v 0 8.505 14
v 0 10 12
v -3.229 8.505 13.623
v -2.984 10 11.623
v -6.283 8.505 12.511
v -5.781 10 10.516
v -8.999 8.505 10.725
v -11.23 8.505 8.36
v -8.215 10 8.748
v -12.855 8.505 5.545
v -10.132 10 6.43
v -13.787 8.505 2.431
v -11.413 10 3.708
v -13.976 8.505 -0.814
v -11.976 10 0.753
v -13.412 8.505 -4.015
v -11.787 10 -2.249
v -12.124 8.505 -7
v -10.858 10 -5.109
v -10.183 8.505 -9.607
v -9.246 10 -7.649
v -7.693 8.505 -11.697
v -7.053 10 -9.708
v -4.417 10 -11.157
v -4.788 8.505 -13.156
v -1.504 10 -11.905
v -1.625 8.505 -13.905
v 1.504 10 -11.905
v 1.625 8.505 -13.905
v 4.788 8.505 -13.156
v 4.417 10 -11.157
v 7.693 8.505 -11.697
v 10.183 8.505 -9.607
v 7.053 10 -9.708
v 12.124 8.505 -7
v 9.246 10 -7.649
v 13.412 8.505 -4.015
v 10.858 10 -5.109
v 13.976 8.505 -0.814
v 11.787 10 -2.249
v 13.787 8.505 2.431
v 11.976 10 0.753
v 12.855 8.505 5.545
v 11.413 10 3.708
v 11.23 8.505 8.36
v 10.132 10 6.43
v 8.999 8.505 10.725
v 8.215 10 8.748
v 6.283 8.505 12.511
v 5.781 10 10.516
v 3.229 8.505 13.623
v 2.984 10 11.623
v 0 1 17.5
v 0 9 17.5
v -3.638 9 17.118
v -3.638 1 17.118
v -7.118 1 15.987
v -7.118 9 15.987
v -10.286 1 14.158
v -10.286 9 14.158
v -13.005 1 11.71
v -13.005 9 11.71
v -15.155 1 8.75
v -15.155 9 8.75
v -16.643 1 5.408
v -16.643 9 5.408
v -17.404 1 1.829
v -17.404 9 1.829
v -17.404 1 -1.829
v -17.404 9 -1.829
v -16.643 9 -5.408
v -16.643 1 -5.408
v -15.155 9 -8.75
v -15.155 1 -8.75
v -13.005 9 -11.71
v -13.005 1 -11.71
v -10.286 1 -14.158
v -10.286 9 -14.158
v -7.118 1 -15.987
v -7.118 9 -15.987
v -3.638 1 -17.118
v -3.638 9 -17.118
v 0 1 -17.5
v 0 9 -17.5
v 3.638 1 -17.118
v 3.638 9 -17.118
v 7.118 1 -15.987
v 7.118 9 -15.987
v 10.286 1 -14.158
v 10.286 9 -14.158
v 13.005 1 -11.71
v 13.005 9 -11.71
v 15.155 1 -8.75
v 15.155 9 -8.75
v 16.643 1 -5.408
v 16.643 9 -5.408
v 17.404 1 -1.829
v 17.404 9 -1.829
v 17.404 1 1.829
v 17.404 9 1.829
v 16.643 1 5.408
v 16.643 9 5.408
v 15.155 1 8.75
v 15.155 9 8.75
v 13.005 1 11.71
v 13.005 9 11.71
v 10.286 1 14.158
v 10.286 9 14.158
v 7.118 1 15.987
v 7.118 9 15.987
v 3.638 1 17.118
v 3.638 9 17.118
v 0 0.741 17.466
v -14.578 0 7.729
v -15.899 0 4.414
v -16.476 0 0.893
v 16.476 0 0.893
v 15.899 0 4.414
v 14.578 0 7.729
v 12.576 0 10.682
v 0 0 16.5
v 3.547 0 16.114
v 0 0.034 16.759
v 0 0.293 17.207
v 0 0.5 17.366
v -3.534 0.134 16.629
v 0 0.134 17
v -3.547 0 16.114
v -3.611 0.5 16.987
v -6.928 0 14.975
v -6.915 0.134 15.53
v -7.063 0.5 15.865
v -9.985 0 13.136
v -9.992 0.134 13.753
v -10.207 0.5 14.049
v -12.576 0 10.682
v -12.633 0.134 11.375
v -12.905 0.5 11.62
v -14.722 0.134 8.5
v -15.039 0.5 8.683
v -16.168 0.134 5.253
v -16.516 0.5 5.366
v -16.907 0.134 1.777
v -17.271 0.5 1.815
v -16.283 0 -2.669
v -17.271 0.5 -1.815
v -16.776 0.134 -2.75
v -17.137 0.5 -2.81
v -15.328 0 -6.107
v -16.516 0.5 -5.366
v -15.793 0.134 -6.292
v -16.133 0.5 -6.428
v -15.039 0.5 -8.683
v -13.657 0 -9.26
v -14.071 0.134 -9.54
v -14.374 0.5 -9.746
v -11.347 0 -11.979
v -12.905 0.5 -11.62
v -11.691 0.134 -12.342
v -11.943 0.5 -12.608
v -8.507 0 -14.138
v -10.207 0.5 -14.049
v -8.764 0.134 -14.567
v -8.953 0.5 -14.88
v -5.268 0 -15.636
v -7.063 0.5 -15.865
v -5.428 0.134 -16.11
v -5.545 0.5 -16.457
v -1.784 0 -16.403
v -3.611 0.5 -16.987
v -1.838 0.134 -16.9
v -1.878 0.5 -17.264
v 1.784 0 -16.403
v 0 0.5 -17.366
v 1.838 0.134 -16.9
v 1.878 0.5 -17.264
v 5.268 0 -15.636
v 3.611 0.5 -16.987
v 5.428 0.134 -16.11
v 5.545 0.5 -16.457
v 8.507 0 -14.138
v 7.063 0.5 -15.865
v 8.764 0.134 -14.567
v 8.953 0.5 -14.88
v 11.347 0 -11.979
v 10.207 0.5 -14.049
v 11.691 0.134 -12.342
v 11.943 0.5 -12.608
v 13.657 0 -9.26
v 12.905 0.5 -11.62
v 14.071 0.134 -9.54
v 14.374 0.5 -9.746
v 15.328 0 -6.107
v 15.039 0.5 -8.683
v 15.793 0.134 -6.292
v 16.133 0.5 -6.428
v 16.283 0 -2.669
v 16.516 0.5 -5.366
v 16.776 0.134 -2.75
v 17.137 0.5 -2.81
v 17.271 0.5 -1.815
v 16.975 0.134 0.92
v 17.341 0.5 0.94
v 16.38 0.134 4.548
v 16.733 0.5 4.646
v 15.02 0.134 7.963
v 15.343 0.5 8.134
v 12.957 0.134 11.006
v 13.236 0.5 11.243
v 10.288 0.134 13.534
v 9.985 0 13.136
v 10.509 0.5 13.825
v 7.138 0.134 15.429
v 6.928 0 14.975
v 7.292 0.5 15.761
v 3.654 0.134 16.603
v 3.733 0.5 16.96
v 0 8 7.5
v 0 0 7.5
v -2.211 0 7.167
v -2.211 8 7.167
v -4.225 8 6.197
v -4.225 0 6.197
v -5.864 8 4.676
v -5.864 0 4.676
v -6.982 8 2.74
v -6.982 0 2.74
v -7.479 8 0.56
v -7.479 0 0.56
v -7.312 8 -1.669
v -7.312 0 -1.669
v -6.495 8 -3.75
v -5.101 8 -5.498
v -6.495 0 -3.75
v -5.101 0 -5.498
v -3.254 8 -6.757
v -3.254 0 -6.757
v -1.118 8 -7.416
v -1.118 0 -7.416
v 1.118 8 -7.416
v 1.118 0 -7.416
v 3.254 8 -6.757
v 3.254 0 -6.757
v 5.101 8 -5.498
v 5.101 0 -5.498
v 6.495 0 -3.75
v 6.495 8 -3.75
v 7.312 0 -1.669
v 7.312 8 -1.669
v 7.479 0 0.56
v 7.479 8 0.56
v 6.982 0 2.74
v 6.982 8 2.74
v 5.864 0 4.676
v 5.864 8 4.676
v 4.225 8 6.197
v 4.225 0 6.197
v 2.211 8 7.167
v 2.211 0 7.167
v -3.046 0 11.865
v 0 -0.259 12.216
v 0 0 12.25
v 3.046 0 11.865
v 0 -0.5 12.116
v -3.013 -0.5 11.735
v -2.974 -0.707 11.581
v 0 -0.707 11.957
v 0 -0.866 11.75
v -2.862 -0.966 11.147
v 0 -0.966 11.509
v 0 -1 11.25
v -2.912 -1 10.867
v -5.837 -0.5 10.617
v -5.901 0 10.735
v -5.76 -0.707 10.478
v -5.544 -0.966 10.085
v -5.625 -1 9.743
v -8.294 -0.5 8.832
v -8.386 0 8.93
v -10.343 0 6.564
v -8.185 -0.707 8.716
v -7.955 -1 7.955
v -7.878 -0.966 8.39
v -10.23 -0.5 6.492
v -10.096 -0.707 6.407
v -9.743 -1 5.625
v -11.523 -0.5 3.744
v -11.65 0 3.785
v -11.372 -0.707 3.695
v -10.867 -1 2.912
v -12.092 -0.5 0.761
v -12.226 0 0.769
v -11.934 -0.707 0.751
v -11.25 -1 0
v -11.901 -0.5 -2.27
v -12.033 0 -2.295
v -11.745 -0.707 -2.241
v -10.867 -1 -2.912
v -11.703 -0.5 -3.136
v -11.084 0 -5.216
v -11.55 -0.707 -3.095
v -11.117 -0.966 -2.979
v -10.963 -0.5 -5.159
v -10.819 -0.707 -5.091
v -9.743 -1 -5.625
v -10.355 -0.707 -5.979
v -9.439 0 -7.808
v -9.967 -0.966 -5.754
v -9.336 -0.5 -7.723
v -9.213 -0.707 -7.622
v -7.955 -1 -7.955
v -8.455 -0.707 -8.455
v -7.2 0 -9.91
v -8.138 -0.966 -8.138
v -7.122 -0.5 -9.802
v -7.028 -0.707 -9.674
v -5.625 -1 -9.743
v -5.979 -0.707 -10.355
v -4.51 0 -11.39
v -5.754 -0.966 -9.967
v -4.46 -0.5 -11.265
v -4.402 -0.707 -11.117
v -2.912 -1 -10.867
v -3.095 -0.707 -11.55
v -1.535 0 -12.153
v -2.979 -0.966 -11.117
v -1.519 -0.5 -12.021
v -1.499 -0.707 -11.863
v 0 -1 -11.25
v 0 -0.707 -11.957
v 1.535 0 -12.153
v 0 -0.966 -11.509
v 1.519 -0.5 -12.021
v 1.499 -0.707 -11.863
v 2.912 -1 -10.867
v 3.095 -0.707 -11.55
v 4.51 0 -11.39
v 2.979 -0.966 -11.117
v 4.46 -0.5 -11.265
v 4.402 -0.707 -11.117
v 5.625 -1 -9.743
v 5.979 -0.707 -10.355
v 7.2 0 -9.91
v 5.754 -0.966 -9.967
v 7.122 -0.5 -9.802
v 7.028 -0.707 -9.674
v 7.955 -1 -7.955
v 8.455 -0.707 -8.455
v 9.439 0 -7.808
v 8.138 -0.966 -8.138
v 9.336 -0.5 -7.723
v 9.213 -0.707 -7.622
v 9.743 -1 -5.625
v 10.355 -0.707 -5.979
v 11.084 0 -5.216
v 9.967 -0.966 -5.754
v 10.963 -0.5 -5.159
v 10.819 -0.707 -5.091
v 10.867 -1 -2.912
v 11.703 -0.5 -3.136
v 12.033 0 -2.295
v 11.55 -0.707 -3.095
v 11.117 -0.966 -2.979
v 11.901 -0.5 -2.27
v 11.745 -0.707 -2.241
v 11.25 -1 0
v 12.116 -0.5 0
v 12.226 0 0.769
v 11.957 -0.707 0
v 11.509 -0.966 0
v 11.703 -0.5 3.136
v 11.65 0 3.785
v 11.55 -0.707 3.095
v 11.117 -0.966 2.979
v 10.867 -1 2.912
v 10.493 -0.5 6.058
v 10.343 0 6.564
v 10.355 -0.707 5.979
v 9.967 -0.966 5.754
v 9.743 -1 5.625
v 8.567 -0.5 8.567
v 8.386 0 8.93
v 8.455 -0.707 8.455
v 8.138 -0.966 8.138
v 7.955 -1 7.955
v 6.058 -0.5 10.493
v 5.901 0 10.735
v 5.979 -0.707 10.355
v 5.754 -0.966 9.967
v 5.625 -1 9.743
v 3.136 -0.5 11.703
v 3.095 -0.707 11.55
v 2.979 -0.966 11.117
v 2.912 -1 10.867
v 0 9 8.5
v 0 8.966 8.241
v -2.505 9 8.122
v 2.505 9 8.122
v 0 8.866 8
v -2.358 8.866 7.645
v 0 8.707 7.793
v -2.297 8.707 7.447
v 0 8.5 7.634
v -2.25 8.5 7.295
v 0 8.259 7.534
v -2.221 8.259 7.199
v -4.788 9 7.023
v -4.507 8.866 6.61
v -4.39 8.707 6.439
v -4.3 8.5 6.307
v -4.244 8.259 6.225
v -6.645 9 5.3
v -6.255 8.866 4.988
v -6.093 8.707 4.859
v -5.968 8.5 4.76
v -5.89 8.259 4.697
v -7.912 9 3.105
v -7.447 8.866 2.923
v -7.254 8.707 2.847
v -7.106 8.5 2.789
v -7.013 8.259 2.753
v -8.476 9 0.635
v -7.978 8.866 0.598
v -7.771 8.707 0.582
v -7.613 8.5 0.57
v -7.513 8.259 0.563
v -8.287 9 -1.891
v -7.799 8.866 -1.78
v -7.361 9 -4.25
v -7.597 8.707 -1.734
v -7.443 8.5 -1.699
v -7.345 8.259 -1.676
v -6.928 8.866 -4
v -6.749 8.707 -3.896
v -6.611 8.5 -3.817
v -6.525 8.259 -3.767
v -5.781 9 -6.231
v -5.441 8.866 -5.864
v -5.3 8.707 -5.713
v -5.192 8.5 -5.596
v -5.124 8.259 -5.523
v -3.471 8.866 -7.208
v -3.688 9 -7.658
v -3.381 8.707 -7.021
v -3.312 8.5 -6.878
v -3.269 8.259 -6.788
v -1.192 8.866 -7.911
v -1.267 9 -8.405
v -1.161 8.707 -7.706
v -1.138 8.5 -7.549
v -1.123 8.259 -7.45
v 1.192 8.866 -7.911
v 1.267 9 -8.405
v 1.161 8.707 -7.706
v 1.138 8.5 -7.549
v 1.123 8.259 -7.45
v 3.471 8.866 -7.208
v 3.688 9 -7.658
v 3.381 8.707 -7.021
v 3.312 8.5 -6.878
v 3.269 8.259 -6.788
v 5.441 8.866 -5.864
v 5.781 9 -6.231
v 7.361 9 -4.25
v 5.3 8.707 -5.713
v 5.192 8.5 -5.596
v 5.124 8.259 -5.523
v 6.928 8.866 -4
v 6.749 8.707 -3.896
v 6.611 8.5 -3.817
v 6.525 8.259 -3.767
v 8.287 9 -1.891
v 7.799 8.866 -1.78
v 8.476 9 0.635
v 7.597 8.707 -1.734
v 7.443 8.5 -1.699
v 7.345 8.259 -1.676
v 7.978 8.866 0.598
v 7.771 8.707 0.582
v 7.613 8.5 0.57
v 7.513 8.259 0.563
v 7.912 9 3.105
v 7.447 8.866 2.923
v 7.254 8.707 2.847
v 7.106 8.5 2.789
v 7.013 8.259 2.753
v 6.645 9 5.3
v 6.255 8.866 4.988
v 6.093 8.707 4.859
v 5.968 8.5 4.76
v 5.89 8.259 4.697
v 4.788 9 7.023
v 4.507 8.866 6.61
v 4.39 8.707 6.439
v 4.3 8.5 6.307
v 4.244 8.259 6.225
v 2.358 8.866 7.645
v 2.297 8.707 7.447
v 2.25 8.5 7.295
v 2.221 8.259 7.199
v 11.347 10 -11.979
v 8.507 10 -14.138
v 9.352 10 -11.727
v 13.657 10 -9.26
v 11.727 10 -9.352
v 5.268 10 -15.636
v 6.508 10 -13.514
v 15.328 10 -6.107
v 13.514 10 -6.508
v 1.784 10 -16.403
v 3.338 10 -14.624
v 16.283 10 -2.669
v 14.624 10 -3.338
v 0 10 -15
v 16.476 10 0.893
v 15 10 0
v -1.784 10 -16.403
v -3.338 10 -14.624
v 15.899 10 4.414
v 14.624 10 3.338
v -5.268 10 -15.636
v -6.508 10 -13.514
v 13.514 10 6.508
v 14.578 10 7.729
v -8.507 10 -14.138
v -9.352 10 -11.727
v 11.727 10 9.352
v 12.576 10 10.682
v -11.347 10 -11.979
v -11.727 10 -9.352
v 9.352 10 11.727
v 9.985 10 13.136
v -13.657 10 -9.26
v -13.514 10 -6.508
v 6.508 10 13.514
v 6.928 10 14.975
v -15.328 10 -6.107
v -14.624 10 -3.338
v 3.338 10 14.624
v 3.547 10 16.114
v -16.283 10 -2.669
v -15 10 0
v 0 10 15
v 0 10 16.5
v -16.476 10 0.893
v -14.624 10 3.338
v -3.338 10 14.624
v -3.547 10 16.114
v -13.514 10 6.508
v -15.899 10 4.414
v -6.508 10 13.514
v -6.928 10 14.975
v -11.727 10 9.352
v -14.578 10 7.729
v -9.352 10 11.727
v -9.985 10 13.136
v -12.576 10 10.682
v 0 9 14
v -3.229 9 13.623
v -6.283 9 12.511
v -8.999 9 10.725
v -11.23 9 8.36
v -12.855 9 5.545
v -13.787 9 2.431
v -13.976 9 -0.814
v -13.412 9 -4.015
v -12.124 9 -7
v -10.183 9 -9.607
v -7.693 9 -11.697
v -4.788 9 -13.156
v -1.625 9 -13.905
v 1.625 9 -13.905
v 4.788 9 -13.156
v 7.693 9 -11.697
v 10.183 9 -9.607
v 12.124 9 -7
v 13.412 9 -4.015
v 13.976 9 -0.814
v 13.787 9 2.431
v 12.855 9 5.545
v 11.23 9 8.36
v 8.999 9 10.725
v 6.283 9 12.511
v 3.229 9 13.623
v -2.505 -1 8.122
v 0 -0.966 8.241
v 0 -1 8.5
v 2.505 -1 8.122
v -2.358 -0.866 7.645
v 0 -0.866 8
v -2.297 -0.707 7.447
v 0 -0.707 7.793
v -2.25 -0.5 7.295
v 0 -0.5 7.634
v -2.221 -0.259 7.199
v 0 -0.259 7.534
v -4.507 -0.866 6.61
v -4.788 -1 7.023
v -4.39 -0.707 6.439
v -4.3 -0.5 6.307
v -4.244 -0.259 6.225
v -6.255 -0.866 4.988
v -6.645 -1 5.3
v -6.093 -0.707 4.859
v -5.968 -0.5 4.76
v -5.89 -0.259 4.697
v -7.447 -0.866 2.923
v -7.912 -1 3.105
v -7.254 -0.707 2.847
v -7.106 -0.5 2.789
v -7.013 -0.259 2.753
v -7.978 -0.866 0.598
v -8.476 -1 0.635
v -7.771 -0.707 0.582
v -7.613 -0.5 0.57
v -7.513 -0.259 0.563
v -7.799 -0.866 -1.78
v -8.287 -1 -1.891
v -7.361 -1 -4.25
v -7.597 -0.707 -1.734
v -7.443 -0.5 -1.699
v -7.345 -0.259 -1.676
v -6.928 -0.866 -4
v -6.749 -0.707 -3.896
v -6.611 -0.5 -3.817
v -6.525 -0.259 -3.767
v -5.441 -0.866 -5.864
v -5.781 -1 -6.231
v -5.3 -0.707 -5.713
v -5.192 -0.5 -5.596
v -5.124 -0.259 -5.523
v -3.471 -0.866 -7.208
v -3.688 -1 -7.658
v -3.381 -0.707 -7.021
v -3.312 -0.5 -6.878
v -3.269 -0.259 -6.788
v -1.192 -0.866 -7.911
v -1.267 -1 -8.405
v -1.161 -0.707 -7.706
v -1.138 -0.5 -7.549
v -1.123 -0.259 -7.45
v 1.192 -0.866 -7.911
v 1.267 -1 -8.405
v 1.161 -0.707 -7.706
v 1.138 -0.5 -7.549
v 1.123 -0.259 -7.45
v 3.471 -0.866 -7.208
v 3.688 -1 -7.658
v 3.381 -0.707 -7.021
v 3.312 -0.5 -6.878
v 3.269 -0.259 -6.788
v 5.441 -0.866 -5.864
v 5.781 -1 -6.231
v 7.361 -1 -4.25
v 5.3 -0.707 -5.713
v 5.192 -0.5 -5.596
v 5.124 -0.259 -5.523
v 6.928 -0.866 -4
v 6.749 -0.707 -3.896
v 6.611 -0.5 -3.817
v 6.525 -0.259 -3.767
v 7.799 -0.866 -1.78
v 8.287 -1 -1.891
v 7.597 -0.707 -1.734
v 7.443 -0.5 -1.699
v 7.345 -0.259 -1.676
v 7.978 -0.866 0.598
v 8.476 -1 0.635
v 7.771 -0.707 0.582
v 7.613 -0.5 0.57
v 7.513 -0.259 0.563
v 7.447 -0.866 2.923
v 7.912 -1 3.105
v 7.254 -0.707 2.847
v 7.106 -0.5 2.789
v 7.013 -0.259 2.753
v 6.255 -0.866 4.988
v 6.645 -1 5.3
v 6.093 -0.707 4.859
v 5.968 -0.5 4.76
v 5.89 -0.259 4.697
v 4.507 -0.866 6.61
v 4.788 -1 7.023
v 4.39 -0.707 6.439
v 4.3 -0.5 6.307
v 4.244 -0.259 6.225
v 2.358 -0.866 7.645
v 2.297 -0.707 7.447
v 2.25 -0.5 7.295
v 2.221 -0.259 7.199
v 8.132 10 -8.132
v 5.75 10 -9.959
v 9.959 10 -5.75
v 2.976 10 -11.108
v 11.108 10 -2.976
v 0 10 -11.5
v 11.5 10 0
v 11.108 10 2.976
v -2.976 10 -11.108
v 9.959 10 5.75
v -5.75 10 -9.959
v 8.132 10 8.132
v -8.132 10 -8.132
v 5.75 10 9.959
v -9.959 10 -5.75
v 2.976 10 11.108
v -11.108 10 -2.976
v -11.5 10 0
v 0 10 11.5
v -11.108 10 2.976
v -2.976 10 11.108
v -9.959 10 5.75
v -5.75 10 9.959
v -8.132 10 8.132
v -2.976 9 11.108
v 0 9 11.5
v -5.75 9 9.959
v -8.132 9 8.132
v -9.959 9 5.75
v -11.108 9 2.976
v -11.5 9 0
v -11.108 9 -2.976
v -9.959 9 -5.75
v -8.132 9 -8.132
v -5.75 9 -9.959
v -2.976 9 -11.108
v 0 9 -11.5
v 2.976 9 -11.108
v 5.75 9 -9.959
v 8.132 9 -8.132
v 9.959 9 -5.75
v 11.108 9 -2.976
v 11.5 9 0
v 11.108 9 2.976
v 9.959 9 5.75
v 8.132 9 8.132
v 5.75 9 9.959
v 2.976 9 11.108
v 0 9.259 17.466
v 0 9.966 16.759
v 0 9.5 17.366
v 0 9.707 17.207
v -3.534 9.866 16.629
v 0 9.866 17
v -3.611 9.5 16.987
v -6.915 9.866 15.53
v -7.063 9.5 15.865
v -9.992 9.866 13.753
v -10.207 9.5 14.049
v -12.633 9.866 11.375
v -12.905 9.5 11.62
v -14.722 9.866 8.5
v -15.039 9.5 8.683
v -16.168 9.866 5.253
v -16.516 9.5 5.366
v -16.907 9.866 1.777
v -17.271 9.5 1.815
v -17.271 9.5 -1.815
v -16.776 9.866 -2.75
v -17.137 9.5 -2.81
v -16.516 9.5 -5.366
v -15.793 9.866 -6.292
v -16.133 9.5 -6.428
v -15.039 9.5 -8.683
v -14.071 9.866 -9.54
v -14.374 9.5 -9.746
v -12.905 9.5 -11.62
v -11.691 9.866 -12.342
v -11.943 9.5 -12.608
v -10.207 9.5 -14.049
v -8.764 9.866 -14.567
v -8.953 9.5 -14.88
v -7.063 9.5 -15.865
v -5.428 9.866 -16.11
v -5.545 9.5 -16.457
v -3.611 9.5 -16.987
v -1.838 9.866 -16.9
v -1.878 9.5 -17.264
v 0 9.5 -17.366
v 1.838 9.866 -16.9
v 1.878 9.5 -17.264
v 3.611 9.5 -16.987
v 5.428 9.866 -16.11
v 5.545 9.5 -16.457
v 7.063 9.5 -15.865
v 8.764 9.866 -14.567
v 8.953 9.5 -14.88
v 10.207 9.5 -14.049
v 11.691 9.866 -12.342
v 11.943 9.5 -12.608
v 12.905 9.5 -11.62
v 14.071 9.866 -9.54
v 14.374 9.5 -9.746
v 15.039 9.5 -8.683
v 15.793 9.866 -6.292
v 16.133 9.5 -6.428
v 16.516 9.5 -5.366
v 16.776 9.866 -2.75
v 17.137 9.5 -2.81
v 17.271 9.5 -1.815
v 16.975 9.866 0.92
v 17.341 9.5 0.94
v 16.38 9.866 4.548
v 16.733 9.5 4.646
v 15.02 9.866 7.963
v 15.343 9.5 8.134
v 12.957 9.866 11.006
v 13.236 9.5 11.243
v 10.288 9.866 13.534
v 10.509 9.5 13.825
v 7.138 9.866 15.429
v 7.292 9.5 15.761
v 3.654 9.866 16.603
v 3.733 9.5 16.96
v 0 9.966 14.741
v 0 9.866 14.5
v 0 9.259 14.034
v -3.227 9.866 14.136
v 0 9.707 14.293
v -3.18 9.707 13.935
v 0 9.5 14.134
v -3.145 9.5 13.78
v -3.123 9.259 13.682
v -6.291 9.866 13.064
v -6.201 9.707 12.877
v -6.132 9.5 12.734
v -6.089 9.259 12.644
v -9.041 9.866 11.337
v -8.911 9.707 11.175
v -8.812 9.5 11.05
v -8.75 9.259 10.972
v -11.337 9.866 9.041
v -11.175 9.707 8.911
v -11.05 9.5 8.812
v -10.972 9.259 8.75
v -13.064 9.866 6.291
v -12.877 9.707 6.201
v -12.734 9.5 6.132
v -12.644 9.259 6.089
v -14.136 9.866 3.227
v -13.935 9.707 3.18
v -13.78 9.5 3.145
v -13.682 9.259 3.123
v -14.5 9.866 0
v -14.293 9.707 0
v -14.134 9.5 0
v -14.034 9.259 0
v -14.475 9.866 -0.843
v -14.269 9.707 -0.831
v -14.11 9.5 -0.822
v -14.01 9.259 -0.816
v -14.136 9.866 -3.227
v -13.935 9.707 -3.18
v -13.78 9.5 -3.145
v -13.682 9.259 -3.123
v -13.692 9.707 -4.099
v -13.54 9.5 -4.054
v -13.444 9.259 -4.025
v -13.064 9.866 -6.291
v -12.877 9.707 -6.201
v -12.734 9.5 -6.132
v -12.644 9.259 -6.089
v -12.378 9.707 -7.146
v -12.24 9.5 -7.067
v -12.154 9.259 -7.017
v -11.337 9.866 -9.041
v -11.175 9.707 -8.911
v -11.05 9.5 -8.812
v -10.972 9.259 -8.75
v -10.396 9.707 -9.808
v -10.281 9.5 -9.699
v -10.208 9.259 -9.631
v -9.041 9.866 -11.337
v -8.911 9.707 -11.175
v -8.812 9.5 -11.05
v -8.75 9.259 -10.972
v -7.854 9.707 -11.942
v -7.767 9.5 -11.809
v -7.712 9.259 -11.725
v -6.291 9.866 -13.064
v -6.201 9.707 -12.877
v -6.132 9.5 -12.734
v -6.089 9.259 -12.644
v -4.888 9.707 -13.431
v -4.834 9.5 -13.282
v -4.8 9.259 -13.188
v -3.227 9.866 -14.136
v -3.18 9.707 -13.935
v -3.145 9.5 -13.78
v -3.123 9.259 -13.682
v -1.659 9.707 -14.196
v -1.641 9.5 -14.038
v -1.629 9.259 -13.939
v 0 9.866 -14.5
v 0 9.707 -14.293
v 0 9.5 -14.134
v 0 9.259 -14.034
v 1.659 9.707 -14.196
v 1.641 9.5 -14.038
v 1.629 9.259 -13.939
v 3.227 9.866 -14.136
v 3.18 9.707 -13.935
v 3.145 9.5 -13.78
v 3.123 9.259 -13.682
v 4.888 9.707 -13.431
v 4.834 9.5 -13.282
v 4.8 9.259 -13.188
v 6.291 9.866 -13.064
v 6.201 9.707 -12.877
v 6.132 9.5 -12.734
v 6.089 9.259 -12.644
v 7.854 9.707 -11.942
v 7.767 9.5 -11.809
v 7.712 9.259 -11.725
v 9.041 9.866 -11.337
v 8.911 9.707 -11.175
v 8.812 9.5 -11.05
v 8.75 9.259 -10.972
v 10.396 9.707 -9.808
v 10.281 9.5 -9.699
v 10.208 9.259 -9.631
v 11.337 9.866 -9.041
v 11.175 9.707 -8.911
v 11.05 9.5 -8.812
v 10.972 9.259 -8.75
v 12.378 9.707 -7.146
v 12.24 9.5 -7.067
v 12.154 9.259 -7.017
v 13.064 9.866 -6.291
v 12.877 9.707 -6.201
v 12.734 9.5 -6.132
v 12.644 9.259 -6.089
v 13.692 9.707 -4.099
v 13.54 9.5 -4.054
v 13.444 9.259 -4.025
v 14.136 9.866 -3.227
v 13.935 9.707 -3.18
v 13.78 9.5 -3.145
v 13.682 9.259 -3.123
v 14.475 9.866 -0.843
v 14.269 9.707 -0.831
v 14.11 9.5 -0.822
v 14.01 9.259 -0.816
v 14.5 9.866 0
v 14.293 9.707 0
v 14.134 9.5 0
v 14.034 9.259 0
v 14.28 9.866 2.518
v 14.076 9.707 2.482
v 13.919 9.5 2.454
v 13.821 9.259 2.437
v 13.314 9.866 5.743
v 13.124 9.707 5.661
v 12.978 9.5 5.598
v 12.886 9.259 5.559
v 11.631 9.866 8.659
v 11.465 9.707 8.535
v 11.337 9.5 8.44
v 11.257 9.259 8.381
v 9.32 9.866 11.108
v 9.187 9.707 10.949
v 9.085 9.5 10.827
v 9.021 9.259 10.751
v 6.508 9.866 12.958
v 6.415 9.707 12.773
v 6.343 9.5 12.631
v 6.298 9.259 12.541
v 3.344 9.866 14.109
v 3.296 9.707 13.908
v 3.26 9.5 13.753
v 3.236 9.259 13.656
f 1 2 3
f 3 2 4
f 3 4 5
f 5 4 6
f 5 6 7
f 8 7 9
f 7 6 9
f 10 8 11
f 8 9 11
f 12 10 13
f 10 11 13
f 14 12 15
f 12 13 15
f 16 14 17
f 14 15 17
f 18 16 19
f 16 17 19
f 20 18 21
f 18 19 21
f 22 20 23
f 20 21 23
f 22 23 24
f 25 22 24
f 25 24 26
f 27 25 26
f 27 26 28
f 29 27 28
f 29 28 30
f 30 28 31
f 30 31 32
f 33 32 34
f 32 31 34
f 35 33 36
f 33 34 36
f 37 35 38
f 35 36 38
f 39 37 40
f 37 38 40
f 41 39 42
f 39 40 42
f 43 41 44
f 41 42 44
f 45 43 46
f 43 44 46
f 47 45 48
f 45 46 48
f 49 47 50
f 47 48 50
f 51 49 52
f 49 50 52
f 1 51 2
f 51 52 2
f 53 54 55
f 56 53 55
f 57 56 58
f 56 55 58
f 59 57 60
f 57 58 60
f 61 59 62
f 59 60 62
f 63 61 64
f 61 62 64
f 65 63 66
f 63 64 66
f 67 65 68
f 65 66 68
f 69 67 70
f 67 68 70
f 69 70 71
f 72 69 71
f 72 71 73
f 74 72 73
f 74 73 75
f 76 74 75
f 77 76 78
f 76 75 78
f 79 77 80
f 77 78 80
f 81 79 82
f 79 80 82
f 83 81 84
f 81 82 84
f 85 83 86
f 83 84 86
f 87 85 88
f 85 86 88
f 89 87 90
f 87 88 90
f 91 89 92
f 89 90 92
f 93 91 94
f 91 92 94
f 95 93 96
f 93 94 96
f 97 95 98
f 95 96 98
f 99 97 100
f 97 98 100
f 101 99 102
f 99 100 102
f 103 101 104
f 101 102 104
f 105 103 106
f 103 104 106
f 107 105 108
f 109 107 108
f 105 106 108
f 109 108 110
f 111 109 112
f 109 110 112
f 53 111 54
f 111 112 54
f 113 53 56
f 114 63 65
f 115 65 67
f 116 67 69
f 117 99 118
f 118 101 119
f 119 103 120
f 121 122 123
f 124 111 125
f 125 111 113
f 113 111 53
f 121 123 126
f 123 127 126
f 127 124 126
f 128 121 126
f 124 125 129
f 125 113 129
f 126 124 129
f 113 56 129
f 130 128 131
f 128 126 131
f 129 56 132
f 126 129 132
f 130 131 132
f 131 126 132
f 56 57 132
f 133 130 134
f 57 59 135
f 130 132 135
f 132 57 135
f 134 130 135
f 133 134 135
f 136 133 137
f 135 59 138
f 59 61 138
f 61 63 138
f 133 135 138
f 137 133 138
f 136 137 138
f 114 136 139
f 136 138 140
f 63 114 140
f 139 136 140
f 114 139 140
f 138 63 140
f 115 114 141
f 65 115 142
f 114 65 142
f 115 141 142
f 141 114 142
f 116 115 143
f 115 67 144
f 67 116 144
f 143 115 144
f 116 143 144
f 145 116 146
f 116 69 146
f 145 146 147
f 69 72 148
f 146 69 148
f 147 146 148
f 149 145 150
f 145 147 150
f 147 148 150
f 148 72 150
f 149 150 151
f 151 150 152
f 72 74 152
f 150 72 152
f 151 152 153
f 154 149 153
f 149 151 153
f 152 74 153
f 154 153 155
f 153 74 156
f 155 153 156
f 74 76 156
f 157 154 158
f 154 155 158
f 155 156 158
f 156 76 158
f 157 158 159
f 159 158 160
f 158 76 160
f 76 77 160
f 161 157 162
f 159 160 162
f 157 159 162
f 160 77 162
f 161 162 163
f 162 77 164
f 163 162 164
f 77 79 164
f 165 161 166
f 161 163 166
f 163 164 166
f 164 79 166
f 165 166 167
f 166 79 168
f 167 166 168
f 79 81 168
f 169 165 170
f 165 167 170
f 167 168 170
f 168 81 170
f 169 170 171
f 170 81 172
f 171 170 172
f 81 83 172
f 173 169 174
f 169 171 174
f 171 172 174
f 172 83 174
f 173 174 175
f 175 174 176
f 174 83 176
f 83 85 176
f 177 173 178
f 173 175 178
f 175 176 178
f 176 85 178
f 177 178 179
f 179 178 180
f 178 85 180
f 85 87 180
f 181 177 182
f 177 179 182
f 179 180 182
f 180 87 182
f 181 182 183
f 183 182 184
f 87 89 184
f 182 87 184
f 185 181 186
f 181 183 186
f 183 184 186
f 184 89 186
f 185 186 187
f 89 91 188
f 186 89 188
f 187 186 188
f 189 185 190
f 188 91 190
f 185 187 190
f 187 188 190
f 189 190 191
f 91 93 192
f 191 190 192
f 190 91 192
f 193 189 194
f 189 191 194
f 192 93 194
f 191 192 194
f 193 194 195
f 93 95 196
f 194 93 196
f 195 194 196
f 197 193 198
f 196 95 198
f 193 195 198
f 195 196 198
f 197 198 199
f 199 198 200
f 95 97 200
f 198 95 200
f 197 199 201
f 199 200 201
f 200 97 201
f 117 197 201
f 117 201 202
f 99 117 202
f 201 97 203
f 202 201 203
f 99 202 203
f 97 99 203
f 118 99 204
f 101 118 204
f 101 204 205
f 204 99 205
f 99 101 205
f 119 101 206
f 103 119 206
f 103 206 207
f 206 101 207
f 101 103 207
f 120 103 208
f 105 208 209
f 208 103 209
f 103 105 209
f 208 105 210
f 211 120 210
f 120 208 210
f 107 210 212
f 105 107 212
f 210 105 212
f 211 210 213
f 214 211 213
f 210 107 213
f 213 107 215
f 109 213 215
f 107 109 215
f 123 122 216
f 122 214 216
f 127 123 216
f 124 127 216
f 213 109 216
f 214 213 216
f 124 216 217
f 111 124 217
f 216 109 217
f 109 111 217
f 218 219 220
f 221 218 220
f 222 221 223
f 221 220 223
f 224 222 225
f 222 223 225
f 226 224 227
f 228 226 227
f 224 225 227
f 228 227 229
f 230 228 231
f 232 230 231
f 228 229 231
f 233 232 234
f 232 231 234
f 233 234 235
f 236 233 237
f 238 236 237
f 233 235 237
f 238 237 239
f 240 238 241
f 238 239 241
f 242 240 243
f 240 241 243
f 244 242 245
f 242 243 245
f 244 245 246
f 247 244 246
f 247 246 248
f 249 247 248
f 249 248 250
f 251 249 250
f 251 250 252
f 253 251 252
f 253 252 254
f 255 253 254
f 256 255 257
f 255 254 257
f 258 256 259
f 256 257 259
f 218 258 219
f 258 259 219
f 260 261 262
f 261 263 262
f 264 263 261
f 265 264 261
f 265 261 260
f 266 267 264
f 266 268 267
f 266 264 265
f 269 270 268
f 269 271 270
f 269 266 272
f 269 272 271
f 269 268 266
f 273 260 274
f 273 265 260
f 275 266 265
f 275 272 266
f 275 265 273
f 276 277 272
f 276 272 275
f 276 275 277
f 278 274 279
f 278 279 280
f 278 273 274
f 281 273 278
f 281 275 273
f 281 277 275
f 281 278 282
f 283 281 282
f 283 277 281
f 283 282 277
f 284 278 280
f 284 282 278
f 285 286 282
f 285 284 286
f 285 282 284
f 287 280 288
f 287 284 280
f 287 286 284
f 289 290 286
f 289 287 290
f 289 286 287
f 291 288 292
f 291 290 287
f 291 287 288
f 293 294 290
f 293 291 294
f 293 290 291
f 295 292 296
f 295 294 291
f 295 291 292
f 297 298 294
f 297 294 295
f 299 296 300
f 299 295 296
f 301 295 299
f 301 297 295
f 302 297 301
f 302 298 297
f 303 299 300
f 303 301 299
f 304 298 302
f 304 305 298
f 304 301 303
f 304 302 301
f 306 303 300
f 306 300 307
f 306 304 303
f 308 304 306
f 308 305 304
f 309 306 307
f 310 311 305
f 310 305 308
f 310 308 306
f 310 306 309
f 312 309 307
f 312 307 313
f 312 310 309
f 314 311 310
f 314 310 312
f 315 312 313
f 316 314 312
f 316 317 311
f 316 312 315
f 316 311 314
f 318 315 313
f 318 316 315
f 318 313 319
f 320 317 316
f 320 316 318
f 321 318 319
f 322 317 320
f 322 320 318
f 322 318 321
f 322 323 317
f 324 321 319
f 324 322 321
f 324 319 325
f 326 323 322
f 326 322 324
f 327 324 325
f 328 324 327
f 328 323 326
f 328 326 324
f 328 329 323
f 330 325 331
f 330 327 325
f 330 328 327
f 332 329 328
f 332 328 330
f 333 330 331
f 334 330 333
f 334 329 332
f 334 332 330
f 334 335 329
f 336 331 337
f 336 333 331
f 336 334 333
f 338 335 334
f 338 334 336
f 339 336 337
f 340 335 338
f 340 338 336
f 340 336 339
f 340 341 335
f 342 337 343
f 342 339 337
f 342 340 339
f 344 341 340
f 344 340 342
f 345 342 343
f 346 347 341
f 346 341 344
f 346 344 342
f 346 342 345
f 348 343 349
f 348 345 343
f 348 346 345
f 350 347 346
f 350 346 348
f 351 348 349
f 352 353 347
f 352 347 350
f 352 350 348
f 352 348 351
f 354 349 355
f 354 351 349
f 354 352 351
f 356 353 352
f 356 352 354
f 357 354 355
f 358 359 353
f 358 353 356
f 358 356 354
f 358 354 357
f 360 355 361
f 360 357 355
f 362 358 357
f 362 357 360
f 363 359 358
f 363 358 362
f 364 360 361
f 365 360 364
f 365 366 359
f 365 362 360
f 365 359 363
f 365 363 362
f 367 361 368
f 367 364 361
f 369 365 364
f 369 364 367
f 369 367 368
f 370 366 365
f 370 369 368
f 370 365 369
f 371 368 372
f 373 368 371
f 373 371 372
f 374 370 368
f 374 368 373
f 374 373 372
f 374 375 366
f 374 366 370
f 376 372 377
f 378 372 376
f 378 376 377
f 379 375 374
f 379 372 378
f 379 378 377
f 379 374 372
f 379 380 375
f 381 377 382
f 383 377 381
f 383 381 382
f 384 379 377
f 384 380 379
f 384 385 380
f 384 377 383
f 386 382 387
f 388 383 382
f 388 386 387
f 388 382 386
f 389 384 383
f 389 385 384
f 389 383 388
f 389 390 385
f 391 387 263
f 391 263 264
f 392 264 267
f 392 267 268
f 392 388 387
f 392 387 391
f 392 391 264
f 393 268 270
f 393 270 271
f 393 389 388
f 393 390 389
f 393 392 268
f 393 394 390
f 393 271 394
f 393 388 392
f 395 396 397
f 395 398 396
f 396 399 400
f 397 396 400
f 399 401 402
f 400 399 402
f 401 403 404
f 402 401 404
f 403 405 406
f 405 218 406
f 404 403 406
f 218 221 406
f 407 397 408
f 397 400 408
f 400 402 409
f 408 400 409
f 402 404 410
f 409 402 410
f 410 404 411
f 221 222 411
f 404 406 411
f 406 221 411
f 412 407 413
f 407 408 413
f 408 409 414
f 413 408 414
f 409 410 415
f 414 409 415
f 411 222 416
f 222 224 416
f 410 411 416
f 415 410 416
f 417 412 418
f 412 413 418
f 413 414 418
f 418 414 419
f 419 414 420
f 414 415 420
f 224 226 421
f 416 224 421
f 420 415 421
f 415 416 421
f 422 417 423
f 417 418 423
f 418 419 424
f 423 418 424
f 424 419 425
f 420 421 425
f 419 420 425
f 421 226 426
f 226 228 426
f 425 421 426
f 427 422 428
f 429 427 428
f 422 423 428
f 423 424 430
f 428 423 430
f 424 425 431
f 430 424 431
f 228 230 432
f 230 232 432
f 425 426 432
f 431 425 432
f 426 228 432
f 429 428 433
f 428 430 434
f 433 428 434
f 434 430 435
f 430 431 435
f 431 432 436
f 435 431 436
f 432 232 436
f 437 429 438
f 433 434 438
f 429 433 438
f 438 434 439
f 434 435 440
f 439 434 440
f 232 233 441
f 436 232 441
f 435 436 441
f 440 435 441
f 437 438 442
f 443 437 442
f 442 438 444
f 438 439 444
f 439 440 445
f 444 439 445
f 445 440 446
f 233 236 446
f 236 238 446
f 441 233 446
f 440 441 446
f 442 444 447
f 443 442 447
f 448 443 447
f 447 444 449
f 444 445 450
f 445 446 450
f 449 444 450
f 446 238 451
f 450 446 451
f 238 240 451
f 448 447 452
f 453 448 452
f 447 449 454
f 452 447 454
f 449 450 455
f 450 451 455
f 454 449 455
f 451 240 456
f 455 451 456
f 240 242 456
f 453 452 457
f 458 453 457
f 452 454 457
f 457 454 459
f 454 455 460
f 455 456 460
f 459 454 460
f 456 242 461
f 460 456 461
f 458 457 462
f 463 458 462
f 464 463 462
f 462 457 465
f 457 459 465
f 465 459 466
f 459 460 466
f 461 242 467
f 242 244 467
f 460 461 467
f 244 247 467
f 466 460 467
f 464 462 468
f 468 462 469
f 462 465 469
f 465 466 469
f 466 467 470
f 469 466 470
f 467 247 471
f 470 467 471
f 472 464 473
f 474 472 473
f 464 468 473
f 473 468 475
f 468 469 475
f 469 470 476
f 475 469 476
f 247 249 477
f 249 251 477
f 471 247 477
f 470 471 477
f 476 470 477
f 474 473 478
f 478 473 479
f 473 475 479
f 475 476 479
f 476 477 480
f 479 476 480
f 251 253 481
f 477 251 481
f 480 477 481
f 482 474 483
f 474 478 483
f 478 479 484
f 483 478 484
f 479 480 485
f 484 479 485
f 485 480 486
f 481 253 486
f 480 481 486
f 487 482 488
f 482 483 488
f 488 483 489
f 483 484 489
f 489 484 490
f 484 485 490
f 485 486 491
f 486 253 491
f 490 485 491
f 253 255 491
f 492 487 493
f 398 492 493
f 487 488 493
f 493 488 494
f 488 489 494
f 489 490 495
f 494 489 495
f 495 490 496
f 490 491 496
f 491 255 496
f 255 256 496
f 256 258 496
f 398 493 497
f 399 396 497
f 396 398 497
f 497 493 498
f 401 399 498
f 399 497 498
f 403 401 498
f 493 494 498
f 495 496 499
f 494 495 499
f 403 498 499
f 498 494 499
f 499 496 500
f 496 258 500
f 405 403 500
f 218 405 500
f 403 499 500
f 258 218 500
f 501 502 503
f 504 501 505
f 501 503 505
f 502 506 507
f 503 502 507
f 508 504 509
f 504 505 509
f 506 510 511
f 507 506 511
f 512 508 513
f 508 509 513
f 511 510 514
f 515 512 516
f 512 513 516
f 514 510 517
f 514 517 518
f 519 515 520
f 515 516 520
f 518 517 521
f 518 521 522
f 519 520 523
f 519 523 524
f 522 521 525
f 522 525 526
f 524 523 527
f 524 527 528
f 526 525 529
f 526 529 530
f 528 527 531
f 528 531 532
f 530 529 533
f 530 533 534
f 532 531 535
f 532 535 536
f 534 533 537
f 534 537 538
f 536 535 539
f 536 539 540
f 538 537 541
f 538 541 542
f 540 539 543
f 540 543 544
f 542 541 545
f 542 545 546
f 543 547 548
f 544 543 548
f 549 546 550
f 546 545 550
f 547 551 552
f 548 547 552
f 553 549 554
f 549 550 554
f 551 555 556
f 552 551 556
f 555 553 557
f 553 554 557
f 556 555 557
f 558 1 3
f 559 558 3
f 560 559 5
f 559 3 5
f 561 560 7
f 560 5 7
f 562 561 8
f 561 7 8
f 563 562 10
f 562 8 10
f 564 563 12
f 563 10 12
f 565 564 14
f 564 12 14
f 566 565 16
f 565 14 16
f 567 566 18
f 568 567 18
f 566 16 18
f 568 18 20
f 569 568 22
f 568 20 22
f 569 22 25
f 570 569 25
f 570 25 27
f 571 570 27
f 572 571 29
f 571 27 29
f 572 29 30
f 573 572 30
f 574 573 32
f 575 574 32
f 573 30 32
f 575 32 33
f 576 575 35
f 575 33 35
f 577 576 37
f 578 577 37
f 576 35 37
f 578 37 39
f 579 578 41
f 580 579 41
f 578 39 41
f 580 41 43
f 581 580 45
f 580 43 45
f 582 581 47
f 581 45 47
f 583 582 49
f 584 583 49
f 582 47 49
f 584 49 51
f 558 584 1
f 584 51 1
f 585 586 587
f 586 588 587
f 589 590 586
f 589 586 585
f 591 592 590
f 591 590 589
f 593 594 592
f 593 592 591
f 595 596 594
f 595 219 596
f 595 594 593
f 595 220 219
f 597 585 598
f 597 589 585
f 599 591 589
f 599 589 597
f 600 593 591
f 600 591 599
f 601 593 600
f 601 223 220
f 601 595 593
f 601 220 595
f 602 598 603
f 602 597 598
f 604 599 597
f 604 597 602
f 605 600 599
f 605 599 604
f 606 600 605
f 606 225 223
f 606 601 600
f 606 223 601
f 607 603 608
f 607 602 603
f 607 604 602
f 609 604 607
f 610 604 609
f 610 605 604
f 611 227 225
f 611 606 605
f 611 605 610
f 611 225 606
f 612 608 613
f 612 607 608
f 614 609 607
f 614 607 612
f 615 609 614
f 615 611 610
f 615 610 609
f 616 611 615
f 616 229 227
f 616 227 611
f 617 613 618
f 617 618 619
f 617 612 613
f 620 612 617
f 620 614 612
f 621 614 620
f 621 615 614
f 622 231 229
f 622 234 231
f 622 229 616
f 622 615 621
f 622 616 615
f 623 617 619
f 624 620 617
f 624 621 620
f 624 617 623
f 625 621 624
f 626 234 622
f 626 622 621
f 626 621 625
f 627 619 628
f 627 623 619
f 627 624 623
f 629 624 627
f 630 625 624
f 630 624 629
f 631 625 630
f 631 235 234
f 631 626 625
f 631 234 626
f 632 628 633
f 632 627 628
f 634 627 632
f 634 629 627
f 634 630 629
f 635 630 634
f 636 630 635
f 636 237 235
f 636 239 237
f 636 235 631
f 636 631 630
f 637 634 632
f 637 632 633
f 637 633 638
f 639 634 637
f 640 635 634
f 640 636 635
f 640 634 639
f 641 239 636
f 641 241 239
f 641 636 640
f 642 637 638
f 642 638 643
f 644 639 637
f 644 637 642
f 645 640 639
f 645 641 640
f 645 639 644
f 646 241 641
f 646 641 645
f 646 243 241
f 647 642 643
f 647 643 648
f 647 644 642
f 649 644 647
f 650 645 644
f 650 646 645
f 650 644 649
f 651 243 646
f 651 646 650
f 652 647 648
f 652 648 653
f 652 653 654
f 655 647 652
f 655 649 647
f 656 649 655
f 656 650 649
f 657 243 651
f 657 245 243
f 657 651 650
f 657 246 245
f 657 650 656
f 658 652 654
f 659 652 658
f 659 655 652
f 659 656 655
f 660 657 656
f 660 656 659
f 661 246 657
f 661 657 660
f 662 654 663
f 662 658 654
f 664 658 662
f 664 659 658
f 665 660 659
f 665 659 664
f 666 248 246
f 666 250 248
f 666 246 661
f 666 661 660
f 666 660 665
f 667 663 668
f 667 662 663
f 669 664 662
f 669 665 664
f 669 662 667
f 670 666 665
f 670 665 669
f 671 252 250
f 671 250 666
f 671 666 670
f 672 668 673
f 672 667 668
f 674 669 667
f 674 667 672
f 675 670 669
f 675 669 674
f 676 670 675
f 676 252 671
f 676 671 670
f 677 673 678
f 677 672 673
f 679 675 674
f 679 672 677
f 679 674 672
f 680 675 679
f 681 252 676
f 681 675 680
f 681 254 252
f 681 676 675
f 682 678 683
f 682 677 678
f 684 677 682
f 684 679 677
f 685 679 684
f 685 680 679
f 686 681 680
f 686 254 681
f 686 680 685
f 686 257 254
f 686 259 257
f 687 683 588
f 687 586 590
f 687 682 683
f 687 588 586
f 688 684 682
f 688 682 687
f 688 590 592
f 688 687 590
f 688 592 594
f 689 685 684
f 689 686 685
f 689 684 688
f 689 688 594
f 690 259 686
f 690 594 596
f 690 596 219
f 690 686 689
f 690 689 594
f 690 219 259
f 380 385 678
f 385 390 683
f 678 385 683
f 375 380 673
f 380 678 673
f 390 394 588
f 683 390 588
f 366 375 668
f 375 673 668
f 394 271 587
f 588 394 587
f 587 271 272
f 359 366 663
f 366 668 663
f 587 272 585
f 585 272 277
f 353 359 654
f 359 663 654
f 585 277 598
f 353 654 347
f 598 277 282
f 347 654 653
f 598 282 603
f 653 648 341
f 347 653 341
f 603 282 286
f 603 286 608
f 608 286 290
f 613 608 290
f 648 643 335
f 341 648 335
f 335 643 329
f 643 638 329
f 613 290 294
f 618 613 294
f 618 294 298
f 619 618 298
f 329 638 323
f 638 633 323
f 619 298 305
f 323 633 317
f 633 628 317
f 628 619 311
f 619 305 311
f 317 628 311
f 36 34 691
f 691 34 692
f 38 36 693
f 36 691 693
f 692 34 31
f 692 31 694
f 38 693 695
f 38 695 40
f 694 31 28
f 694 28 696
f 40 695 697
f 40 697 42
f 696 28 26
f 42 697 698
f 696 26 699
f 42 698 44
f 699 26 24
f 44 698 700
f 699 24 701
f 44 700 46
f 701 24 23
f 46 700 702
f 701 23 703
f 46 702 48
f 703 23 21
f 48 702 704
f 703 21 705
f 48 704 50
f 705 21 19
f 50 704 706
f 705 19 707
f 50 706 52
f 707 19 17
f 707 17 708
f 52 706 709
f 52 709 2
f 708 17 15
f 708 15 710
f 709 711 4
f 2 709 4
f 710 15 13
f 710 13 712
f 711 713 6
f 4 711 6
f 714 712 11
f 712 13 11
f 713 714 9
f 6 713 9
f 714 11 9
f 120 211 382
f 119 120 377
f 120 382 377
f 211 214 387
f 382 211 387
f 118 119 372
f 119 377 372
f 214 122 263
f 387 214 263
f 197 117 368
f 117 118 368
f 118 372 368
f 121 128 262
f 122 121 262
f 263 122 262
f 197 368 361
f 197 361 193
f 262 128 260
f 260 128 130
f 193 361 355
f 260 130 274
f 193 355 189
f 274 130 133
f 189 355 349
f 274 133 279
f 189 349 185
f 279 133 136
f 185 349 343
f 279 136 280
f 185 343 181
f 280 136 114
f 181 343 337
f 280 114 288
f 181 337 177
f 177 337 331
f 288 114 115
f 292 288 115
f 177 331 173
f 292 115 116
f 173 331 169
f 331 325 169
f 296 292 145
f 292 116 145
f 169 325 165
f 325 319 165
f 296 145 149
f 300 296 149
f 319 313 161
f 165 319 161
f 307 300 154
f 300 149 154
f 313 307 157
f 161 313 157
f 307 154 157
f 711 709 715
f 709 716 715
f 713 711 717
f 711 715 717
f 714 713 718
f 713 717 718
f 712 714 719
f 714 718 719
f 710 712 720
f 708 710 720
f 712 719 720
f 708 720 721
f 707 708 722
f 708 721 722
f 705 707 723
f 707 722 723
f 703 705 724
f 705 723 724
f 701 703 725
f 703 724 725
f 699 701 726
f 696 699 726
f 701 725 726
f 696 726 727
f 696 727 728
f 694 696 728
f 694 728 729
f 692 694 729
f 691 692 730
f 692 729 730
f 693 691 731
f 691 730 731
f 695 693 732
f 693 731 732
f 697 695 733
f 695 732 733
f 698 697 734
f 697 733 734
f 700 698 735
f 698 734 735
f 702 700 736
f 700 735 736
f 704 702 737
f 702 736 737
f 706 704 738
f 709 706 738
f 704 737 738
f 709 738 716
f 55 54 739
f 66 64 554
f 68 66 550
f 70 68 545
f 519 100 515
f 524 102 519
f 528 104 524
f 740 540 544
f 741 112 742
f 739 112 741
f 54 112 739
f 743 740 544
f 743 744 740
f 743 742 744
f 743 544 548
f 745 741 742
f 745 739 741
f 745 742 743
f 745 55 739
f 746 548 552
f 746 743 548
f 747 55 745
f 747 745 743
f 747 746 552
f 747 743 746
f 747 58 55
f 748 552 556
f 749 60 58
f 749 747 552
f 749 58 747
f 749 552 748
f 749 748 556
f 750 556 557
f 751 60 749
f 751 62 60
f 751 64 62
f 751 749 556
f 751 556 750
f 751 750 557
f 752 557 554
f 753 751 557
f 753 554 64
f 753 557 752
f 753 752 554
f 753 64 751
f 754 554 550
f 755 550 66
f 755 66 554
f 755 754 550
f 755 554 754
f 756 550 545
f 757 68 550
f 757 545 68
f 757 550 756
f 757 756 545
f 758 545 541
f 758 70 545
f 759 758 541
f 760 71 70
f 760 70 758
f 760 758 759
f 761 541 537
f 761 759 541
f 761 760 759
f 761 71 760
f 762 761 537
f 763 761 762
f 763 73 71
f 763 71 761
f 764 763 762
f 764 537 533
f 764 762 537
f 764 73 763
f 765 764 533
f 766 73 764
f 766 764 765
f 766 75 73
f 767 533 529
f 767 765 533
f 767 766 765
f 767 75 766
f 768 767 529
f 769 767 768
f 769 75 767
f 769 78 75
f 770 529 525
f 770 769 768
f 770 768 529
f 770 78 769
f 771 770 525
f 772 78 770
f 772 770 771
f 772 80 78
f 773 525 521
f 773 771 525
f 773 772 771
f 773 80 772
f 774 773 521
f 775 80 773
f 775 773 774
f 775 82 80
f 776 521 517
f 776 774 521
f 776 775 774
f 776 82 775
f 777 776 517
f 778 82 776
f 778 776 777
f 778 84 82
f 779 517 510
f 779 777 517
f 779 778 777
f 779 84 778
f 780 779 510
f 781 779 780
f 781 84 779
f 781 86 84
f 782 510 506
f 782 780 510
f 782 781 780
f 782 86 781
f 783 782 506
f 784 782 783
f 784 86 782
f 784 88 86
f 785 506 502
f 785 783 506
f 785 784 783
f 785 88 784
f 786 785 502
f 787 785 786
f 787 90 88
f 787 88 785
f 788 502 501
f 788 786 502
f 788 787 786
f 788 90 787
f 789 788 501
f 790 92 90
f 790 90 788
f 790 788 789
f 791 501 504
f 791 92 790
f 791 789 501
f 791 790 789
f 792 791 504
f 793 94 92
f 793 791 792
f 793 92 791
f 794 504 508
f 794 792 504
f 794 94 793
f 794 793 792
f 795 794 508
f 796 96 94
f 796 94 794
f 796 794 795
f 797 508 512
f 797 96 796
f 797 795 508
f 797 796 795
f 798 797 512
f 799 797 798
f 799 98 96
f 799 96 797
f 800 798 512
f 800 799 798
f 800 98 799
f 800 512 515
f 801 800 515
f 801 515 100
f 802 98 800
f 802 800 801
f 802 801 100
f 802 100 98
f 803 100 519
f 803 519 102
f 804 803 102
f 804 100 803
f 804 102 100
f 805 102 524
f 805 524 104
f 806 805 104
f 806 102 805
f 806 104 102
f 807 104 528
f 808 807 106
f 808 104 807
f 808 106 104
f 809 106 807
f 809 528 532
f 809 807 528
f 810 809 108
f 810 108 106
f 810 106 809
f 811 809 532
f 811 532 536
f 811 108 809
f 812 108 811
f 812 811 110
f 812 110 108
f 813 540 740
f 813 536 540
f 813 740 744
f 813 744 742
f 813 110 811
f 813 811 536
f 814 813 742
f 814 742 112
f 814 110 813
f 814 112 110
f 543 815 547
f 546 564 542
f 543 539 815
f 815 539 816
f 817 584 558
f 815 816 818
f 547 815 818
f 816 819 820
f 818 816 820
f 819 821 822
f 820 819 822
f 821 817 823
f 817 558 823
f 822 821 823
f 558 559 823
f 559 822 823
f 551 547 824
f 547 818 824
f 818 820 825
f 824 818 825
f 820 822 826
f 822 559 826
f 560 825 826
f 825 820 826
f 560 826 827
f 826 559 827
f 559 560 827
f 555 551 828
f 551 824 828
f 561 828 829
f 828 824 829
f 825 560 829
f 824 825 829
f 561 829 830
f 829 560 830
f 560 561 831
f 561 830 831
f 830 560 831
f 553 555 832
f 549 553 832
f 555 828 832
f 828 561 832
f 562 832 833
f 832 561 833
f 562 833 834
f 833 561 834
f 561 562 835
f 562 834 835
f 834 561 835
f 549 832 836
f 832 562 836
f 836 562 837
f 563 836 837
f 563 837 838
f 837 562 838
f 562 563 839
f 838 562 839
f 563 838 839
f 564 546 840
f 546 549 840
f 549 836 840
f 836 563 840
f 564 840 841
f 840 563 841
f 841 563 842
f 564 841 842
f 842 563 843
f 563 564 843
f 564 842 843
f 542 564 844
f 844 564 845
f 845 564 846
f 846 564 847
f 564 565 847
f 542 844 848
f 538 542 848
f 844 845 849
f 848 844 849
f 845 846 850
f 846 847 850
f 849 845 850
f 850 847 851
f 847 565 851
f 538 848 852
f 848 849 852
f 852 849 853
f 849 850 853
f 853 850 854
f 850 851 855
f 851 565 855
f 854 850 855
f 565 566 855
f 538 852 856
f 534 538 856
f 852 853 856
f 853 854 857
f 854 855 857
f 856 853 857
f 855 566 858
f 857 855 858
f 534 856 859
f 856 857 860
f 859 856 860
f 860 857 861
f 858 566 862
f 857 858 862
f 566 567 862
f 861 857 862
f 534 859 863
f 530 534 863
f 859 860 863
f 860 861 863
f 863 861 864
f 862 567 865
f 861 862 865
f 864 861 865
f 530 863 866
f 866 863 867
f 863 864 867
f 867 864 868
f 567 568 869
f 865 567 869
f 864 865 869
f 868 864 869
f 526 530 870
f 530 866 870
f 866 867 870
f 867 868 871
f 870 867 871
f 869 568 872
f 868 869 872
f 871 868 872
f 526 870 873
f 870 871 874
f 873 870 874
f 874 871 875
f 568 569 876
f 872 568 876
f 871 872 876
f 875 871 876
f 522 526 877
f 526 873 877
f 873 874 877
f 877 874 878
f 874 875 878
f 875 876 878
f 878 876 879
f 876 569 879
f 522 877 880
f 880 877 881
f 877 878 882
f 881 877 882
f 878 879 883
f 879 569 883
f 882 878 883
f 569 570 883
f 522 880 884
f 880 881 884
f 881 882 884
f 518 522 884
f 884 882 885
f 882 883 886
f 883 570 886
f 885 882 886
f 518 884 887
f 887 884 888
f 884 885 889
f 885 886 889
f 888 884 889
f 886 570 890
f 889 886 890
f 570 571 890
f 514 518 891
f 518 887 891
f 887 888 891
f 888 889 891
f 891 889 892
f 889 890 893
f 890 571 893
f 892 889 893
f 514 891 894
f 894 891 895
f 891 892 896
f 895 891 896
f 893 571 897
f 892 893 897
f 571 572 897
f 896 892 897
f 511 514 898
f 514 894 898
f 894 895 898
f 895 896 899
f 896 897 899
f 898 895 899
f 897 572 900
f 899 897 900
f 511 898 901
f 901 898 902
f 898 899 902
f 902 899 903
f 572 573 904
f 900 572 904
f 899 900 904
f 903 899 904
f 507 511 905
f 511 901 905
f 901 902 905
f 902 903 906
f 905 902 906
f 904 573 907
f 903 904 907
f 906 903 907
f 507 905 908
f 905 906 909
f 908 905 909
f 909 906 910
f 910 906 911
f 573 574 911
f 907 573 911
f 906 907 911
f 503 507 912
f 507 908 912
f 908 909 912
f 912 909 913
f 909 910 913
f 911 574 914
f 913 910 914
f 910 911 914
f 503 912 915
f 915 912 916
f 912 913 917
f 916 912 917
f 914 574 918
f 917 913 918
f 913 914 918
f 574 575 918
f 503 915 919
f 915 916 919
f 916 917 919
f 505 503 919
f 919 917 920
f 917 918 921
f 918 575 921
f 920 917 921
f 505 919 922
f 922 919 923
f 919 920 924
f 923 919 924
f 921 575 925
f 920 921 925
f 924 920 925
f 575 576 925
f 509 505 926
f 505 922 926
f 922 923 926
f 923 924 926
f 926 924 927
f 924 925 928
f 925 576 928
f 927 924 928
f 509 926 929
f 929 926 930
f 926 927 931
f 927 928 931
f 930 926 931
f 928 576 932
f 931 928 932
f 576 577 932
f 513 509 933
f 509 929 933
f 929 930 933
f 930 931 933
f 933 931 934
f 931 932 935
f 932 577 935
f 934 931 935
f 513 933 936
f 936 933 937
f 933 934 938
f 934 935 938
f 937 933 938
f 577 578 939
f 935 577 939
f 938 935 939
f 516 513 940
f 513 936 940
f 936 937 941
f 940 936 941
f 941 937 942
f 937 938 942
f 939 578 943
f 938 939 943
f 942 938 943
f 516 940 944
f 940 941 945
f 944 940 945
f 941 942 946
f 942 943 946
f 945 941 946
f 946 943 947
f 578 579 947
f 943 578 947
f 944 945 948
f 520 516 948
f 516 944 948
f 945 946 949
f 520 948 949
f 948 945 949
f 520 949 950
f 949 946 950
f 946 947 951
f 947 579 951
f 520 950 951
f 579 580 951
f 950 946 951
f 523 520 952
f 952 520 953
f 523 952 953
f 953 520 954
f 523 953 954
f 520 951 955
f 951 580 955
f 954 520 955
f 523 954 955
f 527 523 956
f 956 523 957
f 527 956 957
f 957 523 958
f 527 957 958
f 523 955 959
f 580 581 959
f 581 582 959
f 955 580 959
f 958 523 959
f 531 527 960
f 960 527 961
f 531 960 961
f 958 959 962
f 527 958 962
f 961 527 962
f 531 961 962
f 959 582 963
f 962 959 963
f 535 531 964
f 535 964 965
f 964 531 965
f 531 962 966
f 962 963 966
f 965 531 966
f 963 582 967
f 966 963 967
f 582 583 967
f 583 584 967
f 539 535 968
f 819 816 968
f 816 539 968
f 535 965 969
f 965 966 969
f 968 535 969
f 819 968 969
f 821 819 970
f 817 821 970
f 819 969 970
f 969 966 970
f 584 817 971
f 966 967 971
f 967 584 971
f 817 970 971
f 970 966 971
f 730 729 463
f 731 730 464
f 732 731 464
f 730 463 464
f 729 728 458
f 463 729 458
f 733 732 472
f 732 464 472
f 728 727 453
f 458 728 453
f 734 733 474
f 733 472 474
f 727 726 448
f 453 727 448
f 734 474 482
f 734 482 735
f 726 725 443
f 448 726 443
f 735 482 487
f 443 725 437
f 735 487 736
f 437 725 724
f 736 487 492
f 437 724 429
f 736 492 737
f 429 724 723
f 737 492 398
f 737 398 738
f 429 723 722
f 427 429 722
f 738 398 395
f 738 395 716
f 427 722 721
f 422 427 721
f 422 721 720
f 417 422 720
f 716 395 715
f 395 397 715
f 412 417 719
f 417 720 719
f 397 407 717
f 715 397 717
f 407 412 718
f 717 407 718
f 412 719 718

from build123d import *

# Parameters (mm, degrees)
CROQUIS1_W  = 4.75
CROQUIS1_H  = 1
REDONDEO1_R = 1
REDONDEO2_R = 1


with BuildPart() as part:
    # Croquis1 → Revolución1 (revolve)
    with BuildSketch(Plane.XY, mode=Mode.PRIVATE) as revoluci_n1_sk:
        Polygon((17.5, 10), (14, 10), (14, 8.504672962), (12, 10), (11.5, 10), (11.5, 9), (7.5, 9), (7.5, 0), (12.25, 0), (17.5, 0), align=None)
        with Locations((9.875, -0.5)):
            Rectangle(CROQUIS1_W, CROQUIS1_H)
    revolve(revoluci_n1_sk.sketch.rotate(Axis((0, 22.332999614, 0), (0, -1, 0)), 90), axis=Axis((0, 22.332999614, 0), (0, -1, 0)))

    # Redondeo1
    redondeo1_edges = [part.edges().sort_by_distance(p)[0] for p in [
        (0, 10, -17.5),
        (0, 0, -17.5),
    ]]
    fillet(redondeo1_edges, radius=REDONDEO1_R)

    # Redondeo2
    redondeo2_edges = [part.edges().sort_by_distance(p)[0] for p in [
        (0, 10, -14),
        (0, -1, -12.25),
        (0, -1, -7.5),
        (0, 9, -7.5),
    ]]
    fillet(redondeo2_edges, radius=REDONDEO2_R - 0.0001)  # a hair under: the kernel refuses the full size


solid = part.part
